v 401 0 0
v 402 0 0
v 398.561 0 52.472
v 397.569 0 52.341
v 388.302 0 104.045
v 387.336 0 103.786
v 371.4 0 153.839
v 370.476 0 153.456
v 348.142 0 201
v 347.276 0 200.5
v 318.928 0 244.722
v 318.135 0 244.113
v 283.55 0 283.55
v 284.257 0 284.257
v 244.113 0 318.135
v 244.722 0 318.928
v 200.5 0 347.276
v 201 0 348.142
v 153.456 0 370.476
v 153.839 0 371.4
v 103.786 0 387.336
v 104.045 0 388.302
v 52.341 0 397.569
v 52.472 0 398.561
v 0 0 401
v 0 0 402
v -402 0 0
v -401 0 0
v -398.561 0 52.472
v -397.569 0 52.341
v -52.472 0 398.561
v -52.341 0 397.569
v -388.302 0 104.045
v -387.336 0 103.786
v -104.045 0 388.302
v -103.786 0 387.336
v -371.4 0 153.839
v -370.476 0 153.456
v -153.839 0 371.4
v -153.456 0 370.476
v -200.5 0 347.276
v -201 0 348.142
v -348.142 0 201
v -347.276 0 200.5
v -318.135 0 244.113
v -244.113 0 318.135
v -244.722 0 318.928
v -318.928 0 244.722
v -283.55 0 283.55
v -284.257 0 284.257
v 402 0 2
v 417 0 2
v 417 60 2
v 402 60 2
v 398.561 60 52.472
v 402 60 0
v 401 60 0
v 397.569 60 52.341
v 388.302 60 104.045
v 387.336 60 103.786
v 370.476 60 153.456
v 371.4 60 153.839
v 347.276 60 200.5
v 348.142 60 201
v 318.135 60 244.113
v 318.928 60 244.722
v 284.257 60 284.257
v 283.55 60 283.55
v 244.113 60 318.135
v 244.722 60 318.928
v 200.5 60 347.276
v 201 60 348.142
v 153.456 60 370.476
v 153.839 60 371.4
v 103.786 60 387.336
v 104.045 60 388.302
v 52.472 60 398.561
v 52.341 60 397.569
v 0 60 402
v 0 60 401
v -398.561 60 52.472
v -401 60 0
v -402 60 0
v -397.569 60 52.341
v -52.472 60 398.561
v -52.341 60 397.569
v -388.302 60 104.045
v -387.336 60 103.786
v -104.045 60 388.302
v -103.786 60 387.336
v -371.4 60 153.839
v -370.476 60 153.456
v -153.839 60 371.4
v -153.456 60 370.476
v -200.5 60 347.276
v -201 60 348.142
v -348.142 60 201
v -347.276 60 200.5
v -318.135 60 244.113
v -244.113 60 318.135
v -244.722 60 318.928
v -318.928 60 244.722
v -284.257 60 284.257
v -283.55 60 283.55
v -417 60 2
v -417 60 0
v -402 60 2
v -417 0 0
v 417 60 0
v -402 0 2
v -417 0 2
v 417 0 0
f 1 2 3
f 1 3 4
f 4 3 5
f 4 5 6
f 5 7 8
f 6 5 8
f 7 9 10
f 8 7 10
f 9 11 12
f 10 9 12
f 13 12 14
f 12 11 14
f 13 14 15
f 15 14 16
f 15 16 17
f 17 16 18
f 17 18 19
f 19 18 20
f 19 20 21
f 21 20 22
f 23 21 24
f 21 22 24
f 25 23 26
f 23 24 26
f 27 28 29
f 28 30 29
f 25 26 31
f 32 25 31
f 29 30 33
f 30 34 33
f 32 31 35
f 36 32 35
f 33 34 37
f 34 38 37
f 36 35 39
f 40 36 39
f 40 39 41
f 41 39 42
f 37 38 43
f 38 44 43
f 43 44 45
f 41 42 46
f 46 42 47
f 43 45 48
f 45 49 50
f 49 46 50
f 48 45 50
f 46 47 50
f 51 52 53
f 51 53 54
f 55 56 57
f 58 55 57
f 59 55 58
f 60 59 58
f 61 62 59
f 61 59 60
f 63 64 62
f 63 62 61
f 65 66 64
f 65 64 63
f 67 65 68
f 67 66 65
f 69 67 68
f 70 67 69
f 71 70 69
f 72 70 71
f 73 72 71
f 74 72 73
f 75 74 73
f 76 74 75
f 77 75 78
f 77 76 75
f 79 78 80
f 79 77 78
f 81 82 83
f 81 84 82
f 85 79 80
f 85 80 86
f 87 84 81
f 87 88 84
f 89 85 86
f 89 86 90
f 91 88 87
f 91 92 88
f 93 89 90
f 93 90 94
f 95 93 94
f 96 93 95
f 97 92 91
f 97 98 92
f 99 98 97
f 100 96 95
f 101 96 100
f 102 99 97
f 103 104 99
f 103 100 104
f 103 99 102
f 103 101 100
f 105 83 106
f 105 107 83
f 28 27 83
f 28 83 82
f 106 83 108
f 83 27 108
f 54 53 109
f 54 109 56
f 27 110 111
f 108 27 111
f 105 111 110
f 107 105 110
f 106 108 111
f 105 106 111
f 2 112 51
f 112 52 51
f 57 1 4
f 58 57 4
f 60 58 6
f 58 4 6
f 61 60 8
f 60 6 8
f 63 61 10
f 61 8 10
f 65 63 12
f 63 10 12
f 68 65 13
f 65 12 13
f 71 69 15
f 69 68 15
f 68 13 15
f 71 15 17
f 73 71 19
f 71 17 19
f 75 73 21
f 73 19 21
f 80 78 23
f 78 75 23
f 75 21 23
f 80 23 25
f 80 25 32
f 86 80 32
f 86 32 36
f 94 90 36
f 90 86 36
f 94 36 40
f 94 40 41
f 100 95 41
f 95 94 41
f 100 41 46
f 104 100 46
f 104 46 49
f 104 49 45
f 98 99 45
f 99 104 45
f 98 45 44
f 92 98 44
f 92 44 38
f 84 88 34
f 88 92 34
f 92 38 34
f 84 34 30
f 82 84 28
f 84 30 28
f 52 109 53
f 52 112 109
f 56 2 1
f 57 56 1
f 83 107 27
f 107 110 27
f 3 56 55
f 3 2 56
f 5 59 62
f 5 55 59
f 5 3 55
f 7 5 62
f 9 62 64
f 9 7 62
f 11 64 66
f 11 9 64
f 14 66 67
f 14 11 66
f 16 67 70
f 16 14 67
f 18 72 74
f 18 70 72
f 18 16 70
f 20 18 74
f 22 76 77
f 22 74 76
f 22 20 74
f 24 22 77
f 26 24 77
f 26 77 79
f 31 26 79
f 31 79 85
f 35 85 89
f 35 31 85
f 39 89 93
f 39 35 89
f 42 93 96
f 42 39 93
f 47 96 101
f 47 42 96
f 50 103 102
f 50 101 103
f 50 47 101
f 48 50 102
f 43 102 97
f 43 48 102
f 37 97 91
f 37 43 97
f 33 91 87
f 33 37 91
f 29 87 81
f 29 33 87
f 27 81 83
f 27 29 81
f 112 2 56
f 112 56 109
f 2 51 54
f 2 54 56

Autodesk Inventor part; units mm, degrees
ref_plane "YZ Plane" through (0, 0, 0) normal (1, 0, 0) x (0, 1, 0)
ref_plane "XY Plane" through (0, 0, 0) normal (0, 0, 1) x (1, 0, 0)
sketch "Sketch1" plane through (0, 0, 0) normal (0, 1, 0) x (-1, 0, 0)
  arc A0 (401, 0) -> (-401, 0) centre (0, 0) ccw
  line L0 (0, 0) -> (-401, 0) construction
  line L1 (0, 0) -> (401, 0) construction
  arc A1 (402, 0) -> (-402, 0) centre (0, 0) ccw
  line L2 (0, 0) -> (-402, 0) construction
  line L3 (0, 0) -> (402, 0) construction
  line L4 (402, 0) -> (401, 0)
  line L5 (-402, 0) -> (-401, 0)
  dimension "d0" = 401
  dimension "d1" = 180
  dimension "d2" = 402
  dimension "d3" = 180
extrude "Extrusion1" add sketch "Sketch1" along normal blind 60
sketch "Sketch2" plane through (0, 0, 0) normal (0, 1, 0) x (-1, 0, 0)
  line L0 (-402, 0) -> (-417, 0)
  line L1 (-417, 0) -> (-417, 2)
  line L2 (-417, 2) -> (-402, 2)
  line L3 (-402, 2) -> (-402, 0)
  point P0 (0, 0)
  dimension "d6" = 15
  dimension "d7" = 2
extrude "Extrusion2" add sketch "Sketch2" along normal blind 60
sketch "Sketch3" plane through (0, 0, 0) normal (0, 1, 0) x (-1, 0, 0)
  line L0 (402, 0) -> (417, 0)
  line L1 (417, 0) -> (417, 2)
  line L2 (417, 2) -> (402, 2)
  line L3 (402, 2) -> (402, 0)
  point P0 (0, 0)
  dimension "d10" = 15
  dimension "d11" = 2
extrude "Extrusion3" add sketch "Sketch3" along normal blind 60
ref_plane "Work Plane1" through (0, 30, 0) normal (0, 1, 0) x (-1, 0, 0)
properties part number "Band"
